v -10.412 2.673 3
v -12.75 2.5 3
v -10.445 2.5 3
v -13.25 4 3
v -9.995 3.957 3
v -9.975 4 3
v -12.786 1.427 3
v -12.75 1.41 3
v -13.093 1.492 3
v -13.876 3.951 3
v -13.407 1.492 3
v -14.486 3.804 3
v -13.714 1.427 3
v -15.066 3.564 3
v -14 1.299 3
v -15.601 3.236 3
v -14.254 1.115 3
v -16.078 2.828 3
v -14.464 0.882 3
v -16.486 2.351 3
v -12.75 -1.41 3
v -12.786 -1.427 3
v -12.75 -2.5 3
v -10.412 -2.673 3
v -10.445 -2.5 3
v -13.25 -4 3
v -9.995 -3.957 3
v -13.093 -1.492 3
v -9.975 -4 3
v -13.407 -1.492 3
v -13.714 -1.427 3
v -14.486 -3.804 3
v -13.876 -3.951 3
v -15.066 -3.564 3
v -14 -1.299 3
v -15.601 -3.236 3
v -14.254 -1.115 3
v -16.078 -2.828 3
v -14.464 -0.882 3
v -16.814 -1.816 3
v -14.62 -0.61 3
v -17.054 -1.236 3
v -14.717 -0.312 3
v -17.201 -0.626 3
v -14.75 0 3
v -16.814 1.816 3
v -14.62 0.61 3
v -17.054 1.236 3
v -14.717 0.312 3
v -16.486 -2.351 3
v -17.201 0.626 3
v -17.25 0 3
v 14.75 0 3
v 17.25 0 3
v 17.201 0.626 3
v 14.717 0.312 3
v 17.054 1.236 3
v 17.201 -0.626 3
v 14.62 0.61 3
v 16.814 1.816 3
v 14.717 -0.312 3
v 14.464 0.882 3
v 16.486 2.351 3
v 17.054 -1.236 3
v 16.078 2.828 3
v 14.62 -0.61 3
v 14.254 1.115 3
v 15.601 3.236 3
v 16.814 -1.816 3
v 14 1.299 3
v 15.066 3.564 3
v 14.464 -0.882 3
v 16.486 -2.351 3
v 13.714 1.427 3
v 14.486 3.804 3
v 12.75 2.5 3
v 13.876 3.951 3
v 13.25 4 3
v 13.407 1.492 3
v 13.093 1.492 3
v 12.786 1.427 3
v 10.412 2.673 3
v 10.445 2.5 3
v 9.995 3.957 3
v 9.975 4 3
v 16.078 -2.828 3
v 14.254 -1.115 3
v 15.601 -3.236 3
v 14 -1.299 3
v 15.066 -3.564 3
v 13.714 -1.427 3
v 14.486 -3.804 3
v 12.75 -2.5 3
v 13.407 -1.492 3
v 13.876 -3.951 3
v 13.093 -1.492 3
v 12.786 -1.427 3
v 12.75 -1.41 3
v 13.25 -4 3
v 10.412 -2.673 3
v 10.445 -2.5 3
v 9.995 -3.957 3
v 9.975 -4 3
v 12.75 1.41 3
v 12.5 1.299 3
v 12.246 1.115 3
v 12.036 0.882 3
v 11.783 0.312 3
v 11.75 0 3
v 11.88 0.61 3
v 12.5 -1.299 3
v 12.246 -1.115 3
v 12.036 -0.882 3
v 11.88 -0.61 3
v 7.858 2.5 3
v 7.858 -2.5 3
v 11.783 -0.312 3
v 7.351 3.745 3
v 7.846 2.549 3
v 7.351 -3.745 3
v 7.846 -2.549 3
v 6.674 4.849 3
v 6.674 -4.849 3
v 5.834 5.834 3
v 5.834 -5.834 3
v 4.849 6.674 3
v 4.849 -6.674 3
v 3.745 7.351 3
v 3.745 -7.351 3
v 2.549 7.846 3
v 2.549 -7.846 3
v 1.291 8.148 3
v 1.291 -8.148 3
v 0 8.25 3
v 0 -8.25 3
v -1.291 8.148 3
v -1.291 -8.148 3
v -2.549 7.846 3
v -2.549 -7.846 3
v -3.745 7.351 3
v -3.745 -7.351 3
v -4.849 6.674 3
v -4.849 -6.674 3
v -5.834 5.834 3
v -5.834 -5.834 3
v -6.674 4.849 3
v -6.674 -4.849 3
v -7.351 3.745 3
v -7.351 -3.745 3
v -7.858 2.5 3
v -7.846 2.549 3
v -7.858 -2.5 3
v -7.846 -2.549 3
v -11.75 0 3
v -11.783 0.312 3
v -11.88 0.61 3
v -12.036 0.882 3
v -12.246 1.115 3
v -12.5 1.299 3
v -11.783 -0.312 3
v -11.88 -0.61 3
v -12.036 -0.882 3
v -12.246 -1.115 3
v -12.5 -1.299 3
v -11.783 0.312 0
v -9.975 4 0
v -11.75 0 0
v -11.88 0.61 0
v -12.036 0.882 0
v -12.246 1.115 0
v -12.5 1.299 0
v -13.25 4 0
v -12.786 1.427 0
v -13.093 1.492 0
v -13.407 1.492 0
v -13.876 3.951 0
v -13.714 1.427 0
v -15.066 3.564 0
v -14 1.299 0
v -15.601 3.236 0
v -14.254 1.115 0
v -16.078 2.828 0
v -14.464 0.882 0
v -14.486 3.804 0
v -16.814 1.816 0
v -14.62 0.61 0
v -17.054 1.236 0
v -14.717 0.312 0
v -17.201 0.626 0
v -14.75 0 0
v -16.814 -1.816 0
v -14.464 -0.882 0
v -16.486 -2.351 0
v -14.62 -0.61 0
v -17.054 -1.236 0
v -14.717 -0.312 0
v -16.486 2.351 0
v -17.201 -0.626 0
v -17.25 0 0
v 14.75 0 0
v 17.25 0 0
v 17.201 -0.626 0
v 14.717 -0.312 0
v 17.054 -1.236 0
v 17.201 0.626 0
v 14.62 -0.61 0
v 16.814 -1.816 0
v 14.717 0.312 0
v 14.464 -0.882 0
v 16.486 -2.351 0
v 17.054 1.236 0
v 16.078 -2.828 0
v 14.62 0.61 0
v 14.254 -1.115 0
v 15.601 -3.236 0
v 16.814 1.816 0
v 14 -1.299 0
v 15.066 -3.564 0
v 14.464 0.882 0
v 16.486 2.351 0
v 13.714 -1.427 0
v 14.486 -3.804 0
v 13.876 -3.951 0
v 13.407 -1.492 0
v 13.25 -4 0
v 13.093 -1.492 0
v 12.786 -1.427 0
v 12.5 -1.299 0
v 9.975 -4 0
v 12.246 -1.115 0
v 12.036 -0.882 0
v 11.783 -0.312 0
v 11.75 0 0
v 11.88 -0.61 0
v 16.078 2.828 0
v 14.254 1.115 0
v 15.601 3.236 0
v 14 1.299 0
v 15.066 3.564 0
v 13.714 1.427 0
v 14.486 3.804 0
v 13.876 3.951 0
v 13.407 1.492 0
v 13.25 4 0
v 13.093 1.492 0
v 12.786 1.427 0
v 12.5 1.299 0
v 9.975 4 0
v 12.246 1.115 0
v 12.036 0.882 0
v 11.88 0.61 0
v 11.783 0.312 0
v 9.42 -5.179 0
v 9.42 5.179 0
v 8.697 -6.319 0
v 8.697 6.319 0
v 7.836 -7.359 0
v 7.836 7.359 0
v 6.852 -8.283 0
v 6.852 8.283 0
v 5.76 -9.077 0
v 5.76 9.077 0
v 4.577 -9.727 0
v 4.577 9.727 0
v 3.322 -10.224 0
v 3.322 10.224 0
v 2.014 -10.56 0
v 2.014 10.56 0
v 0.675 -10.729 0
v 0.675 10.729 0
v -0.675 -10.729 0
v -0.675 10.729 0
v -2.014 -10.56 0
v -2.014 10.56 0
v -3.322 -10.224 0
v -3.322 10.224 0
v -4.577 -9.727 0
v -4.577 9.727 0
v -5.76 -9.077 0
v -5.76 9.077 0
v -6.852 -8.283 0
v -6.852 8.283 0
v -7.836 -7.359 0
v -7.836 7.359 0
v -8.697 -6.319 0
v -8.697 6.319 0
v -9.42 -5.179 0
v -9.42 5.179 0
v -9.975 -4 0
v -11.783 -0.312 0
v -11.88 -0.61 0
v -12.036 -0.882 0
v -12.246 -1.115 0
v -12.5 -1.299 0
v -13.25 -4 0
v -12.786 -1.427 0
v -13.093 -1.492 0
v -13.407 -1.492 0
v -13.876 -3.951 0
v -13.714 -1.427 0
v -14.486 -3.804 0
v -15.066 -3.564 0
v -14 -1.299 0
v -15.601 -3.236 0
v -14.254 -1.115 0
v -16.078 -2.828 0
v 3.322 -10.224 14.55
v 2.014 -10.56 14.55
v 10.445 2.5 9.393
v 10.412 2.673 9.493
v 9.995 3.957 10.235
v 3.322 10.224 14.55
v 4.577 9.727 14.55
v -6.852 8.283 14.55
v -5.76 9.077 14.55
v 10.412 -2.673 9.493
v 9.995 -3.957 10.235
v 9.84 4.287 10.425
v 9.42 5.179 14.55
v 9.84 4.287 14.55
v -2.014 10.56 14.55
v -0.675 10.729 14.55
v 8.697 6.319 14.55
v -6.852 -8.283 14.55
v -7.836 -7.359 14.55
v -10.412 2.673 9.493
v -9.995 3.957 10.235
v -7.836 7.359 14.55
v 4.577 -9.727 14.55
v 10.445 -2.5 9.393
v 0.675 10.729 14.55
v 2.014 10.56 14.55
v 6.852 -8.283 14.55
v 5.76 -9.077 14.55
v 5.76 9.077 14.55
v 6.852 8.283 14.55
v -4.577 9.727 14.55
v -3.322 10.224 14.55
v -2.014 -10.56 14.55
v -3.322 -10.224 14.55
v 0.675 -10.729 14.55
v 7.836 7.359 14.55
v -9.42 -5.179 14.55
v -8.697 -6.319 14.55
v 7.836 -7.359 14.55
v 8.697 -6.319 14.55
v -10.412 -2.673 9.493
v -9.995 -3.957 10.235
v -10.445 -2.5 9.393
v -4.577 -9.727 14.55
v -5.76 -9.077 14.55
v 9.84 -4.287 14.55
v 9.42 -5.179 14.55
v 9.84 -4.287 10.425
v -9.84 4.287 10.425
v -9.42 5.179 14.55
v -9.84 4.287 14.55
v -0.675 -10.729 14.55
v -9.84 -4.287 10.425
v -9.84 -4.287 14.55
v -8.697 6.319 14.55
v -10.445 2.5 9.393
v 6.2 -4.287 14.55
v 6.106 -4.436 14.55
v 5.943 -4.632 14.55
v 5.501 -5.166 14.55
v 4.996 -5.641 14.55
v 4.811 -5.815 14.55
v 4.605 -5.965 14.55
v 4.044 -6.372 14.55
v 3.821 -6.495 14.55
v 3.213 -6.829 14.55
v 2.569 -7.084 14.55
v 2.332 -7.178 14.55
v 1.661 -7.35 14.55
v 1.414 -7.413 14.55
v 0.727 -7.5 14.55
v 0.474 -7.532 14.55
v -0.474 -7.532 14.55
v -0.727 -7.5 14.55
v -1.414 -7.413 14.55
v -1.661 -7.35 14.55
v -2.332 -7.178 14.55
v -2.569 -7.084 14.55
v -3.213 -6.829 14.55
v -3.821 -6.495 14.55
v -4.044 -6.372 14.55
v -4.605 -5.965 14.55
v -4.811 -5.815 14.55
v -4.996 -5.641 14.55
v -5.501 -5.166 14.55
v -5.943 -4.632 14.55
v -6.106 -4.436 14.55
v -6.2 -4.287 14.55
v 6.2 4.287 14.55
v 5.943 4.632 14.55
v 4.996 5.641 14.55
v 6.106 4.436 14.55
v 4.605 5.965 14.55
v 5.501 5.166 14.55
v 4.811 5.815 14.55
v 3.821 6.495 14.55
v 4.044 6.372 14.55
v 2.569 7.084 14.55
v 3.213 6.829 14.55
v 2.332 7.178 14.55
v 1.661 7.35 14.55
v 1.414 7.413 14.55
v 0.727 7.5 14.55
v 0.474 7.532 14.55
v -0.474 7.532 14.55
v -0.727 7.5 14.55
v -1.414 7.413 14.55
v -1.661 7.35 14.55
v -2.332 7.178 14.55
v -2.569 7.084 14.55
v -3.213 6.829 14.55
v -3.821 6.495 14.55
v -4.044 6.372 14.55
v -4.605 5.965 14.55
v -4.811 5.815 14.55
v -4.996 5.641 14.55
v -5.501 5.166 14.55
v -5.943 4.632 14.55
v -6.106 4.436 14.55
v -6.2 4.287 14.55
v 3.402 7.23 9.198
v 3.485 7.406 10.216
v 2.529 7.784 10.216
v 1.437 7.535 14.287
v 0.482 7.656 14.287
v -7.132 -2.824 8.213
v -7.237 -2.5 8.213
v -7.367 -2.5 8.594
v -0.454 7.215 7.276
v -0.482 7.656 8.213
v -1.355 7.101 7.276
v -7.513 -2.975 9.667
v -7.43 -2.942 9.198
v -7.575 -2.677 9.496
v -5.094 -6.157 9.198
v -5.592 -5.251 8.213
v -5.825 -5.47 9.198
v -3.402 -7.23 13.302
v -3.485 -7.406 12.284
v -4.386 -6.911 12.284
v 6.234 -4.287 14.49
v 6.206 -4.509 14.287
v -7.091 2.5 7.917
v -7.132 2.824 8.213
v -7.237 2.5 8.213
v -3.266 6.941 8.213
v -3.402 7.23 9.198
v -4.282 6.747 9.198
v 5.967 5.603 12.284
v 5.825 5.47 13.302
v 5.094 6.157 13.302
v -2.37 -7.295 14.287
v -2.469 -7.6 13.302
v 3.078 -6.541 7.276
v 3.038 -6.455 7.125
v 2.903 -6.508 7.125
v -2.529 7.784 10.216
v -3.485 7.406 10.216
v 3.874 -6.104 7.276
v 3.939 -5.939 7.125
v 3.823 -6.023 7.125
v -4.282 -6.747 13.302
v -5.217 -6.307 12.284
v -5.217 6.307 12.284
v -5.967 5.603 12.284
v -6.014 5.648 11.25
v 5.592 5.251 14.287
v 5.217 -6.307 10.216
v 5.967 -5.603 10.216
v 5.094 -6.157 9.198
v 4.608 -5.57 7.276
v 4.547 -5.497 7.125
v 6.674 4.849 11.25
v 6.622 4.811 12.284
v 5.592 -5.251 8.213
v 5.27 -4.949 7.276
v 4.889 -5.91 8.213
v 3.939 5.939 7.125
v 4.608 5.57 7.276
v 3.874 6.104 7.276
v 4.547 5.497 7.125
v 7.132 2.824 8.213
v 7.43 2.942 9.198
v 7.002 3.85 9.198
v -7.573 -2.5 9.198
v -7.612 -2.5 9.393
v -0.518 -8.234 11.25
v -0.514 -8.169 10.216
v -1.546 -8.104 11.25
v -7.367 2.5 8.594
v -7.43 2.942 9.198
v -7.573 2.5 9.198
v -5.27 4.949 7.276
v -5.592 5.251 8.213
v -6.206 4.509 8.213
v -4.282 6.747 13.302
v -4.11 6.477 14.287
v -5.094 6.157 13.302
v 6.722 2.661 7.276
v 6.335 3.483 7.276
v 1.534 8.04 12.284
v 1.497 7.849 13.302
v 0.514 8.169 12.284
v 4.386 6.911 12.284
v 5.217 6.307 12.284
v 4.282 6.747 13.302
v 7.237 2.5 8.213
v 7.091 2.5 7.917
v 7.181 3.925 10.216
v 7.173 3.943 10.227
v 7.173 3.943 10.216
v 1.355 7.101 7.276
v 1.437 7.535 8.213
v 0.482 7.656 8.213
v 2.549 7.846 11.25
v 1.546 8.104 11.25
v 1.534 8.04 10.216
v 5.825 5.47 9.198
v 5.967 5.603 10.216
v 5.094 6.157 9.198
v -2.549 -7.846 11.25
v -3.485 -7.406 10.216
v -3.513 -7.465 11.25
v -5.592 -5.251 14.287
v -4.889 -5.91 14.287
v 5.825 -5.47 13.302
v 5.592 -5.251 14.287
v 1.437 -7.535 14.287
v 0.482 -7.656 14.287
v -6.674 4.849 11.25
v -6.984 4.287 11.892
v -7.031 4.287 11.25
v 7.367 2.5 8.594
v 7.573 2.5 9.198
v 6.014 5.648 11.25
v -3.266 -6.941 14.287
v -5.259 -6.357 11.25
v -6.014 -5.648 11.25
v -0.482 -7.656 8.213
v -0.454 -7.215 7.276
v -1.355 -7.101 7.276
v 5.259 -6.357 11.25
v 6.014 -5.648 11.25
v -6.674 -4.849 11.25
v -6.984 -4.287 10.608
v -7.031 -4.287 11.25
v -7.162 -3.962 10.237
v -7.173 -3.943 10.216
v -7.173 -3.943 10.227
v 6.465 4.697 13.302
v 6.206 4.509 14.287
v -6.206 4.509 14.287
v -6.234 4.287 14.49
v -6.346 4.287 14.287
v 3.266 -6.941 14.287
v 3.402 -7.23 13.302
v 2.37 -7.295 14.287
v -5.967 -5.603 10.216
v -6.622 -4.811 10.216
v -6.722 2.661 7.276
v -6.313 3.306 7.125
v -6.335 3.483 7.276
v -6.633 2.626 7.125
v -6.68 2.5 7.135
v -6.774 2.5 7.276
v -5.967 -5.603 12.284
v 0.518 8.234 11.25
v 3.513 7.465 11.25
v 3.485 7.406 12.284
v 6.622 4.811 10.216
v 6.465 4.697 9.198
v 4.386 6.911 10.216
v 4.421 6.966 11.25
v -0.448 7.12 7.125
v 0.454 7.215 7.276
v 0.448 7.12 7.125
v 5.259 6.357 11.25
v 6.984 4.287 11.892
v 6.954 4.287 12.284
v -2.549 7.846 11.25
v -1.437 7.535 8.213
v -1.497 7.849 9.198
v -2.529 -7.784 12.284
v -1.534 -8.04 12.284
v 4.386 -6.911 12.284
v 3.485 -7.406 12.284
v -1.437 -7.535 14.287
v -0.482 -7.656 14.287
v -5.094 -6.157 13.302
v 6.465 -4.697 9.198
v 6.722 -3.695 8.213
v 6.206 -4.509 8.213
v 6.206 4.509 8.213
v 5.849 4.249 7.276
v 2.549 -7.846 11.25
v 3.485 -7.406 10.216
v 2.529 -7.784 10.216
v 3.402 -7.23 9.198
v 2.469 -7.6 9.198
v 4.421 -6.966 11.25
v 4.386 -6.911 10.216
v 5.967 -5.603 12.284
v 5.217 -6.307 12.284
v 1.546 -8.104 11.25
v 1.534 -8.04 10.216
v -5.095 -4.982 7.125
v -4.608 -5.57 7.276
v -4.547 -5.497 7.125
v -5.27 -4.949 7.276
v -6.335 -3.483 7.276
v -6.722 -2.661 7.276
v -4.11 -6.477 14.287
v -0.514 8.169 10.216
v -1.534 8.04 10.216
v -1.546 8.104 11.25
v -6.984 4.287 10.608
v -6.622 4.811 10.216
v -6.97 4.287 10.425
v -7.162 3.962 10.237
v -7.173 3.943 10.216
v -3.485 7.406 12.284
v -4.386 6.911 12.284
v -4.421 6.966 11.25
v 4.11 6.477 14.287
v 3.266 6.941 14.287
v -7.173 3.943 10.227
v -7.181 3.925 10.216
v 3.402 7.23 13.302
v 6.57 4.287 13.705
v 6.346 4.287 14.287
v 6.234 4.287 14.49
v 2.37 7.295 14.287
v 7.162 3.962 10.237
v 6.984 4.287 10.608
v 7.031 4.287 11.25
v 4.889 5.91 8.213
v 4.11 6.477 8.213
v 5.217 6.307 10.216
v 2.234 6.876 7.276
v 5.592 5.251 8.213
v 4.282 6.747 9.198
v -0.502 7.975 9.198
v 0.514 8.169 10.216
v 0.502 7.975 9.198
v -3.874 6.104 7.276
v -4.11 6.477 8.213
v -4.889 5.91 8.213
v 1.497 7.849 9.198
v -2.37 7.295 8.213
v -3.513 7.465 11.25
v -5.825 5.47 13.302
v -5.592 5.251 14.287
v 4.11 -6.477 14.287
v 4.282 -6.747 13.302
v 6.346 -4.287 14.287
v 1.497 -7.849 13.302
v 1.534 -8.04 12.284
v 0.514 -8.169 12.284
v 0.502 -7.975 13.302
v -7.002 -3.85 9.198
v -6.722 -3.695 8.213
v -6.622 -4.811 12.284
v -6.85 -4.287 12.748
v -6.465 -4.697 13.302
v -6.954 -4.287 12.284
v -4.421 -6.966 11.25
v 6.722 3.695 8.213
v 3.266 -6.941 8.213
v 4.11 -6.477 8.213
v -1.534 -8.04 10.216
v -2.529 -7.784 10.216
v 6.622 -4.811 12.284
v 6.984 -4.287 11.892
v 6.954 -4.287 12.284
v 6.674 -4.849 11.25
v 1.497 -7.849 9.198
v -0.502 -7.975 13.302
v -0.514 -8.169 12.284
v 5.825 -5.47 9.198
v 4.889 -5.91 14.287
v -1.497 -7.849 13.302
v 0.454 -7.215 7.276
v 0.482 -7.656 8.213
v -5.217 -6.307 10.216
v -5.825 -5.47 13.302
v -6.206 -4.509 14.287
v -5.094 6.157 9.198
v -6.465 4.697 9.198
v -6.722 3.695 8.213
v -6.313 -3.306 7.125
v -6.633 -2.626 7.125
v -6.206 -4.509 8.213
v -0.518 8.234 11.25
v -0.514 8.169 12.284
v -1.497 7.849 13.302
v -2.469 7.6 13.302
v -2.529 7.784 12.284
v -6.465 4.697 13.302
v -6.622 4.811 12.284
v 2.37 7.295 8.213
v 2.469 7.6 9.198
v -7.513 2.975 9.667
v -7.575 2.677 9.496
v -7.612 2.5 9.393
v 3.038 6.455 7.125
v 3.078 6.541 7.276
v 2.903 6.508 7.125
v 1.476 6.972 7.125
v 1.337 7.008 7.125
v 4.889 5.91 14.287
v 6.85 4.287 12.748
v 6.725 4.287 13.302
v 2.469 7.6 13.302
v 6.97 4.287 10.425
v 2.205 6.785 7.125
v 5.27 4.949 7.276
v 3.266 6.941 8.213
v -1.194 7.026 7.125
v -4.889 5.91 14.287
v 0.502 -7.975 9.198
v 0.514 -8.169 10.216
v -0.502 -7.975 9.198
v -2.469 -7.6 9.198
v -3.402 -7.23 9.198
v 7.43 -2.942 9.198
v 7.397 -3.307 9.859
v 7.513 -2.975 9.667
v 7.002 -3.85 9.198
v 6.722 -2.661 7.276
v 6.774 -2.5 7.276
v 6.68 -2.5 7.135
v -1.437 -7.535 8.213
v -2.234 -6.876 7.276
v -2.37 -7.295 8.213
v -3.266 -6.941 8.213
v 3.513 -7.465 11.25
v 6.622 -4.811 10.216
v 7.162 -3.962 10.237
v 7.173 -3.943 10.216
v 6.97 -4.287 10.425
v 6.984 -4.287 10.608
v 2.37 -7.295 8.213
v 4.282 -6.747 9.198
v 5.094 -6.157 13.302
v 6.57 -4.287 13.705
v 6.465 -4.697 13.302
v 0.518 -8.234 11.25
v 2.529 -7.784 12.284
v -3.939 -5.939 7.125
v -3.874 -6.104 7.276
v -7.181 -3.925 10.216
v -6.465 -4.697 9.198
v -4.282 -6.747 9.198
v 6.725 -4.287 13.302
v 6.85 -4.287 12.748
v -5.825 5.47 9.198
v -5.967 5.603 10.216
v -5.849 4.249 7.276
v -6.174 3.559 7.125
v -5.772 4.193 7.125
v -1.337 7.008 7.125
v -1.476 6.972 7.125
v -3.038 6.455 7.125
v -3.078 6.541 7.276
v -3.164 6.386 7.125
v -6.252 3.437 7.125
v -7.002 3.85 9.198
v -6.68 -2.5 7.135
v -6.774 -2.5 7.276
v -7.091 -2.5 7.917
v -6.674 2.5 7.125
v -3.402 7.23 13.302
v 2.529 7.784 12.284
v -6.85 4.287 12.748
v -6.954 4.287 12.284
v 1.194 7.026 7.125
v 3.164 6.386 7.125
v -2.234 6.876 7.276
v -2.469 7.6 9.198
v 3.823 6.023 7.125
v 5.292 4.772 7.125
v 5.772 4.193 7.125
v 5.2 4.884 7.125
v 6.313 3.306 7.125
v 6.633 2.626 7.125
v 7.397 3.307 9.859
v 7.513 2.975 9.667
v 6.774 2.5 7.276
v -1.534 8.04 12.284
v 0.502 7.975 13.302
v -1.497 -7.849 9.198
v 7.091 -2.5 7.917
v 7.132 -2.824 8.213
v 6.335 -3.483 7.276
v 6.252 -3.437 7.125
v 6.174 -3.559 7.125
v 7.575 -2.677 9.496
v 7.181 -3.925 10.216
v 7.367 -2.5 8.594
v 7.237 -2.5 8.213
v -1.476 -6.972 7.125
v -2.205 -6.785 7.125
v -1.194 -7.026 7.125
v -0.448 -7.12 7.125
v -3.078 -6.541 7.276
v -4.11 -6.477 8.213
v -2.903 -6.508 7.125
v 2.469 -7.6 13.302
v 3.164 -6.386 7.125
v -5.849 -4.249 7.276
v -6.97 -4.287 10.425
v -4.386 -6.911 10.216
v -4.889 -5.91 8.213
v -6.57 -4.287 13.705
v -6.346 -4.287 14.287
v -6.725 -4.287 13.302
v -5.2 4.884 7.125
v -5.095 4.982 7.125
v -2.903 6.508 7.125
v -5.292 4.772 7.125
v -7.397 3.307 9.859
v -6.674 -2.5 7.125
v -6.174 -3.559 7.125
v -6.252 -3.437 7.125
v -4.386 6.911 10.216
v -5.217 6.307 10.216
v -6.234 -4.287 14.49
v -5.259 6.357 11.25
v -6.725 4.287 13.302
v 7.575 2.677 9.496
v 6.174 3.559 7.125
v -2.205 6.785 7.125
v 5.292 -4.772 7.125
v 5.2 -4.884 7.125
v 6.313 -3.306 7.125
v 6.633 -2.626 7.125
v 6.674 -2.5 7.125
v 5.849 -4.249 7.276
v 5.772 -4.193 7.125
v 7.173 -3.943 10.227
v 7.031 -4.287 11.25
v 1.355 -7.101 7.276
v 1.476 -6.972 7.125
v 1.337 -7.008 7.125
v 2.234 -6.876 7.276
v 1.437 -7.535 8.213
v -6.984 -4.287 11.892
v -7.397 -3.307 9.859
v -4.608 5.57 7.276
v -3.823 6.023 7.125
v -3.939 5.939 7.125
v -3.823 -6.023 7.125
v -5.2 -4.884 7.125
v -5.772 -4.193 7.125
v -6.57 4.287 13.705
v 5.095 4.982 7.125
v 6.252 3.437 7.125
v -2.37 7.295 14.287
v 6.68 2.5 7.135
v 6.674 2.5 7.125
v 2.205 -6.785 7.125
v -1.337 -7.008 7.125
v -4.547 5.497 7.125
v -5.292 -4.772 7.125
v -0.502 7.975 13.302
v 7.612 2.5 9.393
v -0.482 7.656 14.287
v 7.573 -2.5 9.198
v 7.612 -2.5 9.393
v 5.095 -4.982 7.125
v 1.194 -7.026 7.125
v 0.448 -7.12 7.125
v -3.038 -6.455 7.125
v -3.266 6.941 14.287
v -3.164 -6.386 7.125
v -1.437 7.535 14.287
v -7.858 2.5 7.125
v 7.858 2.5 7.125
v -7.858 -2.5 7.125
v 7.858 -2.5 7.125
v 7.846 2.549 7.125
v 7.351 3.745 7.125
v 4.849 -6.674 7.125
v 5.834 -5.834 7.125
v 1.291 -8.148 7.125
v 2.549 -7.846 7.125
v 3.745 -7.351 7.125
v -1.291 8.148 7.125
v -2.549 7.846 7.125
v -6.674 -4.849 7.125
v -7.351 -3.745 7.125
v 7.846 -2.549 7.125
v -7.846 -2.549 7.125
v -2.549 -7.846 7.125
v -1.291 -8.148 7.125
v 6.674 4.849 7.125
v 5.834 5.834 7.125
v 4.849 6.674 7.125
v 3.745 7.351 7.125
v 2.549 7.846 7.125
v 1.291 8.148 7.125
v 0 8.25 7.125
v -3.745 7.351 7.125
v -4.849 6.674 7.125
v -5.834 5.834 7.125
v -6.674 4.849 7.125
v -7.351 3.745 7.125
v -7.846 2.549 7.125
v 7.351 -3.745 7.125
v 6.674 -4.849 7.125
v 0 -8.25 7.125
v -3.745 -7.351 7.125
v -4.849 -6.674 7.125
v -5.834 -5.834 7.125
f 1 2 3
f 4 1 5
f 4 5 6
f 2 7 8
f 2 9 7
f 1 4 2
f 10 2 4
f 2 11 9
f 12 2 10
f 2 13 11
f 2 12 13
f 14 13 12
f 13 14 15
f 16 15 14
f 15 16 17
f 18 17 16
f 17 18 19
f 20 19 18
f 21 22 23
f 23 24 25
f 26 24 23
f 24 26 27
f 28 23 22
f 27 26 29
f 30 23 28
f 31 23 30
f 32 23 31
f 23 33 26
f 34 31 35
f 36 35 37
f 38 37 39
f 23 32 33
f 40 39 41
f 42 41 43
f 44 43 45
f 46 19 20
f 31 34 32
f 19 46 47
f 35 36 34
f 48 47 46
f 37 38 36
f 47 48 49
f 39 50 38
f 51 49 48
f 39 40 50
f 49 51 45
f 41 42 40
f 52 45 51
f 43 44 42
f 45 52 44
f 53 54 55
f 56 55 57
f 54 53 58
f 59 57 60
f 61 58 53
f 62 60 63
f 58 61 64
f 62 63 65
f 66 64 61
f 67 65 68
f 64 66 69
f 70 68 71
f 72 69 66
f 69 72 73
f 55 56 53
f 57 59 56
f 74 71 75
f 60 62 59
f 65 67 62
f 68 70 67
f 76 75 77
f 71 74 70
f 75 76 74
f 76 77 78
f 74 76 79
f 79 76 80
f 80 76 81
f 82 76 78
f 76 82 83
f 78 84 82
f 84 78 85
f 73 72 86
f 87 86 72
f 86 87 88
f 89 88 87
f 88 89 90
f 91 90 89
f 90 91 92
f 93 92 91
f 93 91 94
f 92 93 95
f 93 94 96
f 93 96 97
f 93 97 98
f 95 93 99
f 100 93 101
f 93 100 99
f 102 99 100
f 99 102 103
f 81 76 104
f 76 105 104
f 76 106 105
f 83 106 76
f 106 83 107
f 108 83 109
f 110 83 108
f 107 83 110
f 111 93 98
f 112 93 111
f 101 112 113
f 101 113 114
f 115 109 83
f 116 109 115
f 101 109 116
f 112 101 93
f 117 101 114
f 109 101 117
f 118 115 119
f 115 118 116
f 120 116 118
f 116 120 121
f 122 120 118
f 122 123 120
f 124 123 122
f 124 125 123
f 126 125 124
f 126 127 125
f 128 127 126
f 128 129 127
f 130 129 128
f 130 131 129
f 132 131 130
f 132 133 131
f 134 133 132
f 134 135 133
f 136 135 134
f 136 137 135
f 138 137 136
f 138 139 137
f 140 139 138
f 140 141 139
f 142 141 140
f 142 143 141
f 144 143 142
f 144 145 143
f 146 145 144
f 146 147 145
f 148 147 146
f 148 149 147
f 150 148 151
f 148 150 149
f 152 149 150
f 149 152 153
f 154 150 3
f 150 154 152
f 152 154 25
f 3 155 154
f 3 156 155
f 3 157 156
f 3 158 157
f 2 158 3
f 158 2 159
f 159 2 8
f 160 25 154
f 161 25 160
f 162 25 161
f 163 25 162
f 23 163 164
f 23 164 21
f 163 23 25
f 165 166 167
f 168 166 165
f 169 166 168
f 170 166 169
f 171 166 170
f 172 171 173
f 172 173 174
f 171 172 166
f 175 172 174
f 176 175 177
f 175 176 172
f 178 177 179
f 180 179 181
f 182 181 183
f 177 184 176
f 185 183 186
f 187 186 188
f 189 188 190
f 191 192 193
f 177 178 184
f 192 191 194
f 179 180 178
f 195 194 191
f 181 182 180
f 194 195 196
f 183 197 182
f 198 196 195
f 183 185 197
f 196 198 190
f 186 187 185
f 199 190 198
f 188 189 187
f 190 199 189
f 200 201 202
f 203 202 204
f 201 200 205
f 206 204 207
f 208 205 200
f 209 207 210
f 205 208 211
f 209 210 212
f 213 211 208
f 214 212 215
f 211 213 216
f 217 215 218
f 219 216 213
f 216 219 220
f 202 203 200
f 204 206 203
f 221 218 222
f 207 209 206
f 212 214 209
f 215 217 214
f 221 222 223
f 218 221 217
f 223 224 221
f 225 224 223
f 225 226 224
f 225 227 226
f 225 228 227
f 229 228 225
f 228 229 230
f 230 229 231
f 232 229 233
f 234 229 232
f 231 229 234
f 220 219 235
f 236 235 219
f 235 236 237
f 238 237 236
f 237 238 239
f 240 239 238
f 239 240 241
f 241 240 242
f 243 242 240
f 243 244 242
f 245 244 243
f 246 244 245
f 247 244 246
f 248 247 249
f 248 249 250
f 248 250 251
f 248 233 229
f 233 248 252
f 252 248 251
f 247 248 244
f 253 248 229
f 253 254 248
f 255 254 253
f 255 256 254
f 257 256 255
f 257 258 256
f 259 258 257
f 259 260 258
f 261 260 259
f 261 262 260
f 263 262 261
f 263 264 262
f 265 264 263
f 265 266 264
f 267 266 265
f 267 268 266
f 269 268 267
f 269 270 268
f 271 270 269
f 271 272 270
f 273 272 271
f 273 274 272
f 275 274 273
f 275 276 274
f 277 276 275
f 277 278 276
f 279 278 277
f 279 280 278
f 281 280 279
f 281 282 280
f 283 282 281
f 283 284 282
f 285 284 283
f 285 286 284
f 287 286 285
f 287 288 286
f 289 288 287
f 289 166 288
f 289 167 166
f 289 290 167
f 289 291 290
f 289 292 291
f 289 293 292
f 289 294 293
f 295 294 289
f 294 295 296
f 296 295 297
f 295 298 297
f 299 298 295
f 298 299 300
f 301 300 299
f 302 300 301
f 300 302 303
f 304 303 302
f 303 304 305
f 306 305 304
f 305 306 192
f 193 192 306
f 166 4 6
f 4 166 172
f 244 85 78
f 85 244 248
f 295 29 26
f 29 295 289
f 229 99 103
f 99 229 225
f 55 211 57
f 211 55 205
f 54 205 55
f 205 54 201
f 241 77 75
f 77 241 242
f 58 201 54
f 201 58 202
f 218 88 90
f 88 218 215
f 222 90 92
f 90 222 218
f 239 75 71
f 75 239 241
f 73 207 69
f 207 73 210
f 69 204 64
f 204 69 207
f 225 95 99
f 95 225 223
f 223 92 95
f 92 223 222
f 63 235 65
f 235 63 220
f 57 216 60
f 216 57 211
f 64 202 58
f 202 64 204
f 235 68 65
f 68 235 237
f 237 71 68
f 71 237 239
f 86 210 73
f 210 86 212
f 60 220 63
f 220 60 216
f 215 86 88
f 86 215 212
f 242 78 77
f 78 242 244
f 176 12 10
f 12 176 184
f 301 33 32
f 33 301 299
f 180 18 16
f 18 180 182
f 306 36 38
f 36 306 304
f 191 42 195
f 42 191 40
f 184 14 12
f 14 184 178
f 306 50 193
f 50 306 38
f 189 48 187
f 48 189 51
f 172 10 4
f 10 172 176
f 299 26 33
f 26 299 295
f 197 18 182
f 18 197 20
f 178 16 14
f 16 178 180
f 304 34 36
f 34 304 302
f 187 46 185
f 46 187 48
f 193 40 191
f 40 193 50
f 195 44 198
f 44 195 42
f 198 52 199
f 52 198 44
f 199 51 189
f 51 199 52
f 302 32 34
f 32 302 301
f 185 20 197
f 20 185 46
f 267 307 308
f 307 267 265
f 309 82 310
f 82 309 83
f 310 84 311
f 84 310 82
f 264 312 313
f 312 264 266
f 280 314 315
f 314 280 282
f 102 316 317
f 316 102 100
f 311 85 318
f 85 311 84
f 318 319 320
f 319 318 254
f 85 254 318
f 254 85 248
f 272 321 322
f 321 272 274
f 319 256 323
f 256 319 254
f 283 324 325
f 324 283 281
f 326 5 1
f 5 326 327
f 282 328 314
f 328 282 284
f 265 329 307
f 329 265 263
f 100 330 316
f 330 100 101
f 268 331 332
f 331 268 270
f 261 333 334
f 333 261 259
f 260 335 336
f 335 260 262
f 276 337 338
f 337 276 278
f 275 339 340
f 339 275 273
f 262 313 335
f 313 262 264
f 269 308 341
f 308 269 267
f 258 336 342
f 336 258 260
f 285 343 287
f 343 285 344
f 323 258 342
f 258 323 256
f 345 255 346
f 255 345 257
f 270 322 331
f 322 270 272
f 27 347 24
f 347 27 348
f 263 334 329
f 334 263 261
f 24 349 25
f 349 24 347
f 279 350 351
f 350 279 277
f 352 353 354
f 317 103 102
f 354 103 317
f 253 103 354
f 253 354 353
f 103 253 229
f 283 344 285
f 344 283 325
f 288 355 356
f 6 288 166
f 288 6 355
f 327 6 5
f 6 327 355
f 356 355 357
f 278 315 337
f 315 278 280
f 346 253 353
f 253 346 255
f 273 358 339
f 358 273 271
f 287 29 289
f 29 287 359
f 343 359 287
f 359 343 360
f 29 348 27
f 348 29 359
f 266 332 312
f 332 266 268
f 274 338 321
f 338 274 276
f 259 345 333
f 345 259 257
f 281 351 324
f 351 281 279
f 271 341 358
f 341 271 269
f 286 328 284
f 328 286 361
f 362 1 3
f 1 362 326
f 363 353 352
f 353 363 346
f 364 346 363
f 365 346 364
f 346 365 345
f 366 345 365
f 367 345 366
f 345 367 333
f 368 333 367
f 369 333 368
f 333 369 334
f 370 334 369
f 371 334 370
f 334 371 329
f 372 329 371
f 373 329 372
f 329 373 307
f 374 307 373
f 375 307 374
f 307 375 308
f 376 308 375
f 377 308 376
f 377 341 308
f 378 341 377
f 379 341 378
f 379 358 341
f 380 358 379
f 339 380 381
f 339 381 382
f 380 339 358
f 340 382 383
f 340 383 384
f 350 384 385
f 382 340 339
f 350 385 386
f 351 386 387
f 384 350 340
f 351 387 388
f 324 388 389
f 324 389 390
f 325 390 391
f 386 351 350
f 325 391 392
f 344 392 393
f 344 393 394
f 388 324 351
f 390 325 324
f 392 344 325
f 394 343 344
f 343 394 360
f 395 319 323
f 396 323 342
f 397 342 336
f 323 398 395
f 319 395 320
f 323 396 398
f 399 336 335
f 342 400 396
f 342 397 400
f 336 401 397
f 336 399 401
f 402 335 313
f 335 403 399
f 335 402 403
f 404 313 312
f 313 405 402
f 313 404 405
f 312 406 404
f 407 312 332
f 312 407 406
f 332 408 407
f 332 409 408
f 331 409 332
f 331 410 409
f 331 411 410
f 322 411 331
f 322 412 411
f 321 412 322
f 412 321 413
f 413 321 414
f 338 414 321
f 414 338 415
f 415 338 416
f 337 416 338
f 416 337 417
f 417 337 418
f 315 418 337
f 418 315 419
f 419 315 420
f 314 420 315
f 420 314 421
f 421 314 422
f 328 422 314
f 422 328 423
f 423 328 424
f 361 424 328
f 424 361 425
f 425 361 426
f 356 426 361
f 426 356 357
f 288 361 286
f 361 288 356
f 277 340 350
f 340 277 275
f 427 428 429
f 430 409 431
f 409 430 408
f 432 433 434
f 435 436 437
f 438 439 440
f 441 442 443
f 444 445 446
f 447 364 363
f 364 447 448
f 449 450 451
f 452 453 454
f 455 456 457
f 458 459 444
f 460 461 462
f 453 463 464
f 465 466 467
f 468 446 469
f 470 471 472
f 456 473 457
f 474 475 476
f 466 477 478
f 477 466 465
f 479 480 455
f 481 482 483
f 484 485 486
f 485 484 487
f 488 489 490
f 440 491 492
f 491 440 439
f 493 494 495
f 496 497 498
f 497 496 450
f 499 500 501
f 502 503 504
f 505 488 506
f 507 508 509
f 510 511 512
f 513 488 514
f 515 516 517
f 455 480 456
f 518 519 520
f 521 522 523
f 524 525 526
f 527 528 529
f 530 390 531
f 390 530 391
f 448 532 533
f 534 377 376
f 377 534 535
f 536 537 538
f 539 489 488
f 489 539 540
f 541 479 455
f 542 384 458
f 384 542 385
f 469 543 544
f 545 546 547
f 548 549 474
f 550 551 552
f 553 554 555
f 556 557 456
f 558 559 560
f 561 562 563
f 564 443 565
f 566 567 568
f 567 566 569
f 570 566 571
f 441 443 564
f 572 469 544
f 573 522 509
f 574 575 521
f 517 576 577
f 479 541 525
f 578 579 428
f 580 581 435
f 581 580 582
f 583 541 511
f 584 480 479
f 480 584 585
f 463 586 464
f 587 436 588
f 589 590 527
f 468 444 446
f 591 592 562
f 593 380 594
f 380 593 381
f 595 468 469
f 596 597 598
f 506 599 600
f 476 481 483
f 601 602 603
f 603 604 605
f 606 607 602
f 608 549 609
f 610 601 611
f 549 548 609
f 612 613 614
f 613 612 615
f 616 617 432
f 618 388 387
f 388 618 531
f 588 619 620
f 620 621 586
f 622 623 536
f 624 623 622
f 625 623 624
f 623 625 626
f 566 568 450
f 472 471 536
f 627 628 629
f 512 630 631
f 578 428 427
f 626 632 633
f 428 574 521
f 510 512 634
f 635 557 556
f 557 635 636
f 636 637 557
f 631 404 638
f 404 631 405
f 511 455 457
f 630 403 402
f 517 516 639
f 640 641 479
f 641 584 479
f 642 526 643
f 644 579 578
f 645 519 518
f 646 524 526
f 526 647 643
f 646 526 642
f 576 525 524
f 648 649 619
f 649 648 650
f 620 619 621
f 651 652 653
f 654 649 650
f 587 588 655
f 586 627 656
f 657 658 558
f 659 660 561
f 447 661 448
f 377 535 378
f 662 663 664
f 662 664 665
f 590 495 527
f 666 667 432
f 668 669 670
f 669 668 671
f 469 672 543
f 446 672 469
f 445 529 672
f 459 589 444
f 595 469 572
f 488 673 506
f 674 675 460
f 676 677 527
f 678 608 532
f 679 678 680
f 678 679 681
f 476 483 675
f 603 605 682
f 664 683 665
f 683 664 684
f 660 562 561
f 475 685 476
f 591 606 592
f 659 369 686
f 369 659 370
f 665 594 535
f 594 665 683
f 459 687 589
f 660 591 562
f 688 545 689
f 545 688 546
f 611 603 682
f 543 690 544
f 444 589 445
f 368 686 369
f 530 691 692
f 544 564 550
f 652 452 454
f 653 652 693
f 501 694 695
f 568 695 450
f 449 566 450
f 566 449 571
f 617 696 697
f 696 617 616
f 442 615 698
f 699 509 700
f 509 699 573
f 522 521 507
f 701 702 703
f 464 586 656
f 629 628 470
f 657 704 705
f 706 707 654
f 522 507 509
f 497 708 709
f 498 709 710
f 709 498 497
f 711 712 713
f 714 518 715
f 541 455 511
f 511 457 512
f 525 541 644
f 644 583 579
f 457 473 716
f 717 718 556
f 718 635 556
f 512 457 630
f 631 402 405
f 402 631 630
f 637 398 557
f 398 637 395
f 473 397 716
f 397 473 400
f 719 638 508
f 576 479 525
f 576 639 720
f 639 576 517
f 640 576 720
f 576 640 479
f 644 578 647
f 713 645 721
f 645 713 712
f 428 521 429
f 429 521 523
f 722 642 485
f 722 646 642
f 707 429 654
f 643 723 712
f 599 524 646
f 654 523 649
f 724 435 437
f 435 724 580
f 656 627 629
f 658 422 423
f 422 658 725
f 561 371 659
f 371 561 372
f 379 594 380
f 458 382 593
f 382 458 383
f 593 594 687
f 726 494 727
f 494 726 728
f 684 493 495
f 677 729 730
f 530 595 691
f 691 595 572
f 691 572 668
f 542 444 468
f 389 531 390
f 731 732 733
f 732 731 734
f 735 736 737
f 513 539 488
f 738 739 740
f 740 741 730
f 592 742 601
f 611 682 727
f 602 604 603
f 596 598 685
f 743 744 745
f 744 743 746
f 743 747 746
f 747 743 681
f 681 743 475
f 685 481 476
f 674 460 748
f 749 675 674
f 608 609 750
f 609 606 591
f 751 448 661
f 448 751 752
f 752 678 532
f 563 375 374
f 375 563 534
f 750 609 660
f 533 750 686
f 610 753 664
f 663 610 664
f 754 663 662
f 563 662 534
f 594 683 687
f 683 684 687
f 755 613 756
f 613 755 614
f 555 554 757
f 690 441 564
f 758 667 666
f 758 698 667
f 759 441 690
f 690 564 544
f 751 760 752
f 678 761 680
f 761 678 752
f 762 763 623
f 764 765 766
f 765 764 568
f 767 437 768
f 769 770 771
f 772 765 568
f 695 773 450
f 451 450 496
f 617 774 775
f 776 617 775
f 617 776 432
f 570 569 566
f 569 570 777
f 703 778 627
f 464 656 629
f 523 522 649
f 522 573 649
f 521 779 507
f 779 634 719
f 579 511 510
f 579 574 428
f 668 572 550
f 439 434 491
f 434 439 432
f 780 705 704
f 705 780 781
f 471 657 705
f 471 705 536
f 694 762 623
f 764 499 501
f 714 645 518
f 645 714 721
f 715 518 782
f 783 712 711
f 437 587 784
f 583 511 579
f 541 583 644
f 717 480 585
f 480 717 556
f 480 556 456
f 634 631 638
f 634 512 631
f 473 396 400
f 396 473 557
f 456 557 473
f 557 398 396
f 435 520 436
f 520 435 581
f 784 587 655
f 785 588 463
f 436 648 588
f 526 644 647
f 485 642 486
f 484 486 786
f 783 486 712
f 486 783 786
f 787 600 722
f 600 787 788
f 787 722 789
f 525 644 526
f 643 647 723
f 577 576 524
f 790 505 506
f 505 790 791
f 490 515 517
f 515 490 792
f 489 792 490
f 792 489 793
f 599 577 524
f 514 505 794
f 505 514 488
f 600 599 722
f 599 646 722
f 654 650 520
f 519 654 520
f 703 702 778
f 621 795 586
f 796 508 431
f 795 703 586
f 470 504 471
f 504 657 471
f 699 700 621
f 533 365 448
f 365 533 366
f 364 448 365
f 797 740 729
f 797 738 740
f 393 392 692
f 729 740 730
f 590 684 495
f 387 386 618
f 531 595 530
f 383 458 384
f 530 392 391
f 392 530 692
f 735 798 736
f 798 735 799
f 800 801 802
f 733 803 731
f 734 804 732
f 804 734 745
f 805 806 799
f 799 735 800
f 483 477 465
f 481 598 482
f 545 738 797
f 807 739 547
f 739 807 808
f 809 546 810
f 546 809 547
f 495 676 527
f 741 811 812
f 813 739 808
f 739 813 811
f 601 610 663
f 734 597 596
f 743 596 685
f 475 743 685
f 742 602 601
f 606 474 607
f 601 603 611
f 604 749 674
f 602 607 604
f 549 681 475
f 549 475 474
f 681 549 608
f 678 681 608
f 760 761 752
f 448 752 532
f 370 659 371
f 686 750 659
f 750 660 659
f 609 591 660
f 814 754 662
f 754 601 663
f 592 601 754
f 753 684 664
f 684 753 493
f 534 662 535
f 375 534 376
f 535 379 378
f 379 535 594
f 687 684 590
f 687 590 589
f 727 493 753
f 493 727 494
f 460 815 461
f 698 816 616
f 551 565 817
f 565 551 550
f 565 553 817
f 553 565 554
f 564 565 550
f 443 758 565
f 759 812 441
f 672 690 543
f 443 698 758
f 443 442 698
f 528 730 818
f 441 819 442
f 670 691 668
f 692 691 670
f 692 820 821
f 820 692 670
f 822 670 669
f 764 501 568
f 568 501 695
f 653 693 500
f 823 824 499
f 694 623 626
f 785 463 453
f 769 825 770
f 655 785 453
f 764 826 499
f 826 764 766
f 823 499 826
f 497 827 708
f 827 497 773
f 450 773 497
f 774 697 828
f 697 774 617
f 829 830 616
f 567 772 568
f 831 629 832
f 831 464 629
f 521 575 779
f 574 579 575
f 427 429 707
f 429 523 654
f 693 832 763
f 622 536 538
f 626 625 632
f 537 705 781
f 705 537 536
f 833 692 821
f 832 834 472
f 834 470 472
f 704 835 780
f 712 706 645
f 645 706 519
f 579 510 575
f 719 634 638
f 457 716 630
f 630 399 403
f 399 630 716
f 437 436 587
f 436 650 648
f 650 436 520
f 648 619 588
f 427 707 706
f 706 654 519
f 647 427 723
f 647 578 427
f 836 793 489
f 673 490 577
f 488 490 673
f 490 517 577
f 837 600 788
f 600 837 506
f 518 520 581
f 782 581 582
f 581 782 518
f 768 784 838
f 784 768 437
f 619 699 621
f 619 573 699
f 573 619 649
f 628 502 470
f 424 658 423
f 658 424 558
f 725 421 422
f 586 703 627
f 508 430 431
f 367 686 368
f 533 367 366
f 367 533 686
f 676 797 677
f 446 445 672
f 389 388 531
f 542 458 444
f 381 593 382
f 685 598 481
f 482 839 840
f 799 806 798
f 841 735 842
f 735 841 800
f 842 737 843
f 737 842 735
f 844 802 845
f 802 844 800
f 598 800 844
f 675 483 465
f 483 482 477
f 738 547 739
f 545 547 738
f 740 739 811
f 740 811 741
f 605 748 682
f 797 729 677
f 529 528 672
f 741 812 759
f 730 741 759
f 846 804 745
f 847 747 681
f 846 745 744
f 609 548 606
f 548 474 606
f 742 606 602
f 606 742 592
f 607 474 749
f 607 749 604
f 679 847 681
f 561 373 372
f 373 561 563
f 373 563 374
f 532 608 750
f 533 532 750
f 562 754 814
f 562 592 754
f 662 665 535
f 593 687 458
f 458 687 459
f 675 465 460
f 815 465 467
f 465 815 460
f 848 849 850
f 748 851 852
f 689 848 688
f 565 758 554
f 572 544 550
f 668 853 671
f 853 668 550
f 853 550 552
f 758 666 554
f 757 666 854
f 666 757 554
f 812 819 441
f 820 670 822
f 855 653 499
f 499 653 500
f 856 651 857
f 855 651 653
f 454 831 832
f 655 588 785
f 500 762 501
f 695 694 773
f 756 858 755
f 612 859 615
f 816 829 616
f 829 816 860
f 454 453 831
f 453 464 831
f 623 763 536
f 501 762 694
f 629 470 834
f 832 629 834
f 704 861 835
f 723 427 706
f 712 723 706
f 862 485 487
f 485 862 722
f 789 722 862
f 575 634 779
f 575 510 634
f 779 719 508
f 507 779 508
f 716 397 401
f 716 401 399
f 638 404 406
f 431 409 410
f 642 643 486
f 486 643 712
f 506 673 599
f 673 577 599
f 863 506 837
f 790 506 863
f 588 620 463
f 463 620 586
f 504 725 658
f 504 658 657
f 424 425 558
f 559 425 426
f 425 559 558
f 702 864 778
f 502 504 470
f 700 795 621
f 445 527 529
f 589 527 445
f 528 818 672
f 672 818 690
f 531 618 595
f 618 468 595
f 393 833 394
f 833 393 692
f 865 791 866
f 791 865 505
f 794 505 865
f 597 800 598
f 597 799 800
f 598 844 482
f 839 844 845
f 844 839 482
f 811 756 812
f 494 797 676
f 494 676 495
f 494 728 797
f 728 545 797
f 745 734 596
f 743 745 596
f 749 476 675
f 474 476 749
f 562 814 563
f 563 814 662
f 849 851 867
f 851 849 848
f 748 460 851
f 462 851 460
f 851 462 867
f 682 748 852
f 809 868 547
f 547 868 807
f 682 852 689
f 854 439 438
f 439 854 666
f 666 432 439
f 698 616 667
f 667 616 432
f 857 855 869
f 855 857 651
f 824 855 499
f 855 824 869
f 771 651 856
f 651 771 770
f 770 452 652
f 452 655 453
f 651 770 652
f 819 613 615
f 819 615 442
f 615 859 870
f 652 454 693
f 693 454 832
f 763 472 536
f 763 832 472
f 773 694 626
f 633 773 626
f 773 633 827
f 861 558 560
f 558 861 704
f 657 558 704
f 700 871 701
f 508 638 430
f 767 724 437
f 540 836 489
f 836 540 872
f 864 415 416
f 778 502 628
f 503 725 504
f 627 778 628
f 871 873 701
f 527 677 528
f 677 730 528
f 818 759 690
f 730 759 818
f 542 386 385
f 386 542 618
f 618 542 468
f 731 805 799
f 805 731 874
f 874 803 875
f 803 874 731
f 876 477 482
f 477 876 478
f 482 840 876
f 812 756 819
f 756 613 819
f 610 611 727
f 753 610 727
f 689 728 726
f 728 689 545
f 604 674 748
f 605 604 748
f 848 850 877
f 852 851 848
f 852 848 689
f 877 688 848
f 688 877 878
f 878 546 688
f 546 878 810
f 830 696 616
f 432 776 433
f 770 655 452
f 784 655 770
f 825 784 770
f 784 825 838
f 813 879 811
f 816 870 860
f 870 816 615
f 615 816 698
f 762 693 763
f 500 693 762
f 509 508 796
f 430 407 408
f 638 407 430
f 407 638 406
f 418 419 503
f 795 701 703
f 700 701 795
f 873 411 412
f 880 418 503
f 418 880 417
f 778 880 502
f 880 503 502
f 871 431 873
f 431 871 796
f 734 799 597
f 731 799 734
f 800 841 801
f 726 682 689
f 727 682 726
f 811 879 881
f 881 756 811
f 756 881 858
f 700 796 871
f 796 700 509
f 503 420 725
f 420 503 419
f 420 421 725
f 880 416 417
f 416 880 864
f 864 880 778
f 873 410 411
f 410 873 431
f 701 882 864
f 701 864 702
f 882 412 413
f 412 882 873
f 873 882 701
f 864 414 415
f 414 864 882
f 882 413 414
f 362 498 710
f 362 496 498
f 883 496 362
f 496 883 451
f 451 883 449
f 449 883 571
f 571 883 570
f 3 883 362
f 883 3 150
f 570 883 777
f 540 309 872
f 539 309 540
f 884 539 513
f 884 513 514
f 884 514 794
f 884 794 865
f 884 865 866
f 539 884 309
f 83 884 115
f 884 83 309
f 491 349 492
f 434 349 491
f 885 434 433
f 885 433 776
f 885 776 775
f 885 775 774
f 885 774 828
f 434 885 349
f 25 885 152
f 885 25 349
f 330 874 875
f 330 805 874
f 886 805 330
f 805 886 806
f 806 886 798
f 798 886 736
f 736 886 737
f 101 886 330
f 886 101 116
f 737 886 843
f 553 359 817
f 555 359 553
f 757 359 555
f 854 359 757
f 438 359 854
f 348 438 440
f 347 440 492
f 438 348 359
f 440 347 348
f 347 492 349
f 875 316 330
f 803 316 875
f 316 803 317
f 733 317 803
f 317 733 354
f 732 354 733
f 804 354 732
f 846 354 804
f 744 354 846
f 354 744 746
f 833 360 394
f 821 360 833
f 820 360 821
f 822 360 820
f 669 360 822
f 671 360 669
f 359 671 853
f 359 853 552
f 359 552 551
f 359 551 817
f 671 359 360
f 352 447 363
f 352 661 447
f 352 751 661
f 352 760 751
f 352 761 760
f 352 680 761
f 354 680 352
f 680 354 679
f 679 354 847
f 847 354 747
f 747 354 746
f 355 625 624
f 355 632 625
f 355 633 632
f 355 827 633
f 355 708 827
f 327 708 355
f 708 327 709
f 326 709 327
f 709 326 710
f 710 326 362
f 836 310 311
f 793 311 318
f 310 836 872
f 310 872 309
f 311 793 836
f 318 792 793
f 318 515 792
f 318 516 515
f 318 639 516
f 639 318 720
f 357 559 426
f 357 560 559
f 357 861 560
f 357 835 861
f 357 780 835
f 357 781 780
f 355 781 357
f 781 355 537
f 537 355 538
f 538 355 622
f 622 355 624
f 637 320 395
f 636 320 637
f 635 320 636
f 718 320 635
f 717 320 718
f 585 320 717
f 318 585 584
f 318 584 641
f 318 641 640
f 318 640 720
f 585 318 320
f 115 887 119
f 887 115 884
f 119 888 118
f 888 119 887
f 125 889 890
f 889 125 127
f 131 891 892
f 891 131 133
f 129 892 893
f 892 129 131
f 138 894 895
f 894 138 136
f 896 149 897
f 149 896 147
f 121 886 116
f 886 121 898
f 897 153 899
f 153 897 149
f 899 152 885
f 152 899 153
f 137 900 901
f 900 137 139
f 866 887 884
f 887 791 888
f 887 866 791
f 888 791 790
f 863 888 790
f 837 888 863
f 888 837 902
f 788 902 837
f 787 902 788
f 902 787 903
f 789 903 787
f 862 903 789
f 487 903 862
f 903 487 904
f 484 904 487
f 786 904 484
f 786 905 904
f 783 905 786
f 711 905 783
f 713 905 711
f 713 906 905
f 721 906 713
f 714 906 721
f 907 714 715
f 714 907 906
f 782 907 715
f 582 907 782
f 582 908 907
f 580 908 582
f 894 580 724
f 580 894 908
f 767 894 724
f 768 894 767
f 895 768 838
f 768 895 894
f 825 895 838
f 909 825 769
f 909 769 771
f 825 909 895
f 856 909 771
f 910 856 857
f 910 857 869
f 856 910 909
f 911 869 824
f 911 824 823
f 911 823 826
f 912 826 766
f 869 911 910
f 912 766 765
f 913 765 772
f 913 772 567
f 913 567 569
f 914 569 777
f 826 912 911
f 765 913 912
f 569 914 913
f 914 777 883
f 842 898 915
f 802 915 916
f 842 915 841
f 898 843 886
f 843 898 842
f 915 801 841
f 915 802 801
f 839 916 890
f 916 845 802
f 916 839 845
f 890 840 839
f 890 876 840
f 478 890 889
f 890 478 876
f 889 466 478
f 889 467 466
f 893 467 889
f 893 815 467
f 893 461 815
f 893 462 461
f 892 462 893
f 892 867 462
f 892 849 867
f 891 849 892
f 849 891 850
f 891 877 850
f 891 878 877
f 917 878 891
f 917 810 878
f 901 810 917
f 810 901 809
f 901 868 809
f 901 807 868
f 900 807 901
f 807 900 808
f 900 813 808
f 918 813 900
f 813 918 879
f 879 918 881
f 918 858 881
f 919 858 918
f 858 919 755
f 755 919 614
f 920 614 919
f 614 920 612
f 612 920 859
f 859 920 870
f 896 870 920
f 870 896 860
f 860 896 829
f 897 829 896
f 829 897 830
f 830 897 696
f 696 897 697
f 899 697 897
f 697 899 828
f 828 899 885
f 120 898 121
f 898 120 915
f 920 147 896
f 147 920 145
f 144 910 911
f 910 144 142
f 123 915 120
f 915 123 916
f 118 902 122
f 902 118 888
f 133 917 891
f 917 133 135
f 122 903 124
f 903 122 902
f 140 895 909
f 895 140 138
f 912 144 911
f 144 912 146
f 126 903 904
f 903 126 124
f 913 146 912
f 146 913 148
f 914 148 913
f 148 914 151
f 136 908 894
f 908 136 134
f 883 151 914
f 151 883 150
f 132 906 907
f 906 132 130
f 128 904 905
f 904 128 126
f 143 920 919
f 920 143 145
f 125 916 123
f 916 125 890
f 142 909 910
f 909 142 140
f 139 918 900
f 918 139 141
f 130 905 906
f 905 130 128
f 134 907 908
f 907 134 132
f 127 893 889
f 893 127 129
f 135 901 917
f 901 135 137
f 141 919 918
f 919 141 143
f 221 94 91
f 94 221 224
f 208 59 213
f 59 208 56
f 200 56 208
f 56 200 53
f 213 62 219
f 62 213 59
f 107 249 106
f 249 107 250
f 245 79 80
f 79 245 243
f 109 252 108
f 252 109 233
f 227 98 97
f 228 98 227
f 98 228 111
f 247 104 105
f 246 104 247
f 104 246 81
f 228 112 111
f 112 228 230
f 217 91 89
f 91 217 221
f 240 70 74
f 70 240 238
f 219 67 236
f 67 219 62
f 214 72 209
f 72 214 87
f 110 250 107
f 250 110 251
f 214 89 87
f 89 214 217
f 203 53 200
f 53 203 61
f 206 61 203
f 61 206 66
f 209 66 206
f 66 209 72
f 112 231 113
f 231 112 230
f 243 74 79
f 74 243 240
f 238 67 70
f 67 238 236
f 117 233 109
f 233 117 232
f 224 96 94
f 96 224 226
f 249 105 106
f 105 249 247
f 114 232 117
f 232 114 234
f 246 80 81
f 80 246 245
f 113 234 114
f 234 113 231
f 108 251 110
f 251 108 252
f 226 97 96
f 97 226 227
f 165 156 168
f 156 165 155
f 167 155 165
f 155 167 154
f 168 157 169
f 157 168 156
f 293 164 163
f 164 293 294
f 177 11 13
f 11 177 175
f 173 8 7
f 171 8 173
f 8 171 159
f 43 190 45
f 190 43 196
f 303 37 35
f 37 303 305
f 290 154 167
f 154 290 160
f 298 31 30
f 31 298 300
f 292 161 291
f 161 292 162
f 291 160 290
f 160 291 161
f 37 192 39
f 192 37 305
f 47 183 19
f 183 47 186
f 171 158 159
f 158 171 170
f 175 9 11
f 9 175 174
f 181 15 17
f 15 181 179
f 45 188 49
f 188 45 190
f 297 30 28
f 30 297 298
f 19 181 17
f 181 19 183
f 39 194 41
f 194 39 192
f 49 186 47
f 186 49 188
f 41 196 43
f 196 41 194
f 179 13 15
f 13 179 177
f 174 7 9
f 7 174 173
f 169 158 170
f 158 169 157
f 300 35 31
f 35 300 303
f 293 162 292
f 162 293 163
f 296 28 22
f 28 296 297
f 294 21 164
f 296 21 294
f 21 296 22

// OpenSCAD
ballDiameter = 16.5;
holeSize = 3;
wallThickness = 2.5;
gapWidth = 5;
baseThickness = 3;

baseHeight = ballDiameter+wallThickness*2;
baseWidth = wallThickness*4+ballDiameter;

module mainShape(){
	translate([-baseWidth/2, -wallThickness-holeSize/2]) cube([baseWidth, wallThickness*2+holeSize, baseThickness]);
	
	translate([baseHeight/2+wallThickness,0,0]) cylinder(baseThickness, holeSize/2+wallThickness,holeSize/2+wallThickness,$fn=40);
	translate([-baseHeight/2-wallThickness,0,0]) cylinder(baseThickness, holeSize/2+wallThickness,holeSize/2+wallThickness,$fn=40);

	cylinder(baseThickness+ballDiameter*0.7,baseHeight/2, baseHeight/2, $fn=50);
}

module cutout(){
	translate([0,0,ballDiameter/2+holeSize]) sphere(ballDiameter/2, $fn=50);
	translate([-baseHeight/2-2,-gapWidth/2,baseThickness]) cube([baseHeight+4,gapWidth,ballDiameter]);
	translate([-baseHeight/2-2,0,baseThickness+ballDiameter*0.6]) rotate([0,90]) cylinder(baseHeight+4,ballDiameter*0.3,ballDiameter*0.3,$fn=6);
	translate([0,0,baseThickness]) cylinder(ballDiameter/4, ballDiameter/2, ballDiameter/2, $fn=40);
}

module mountingHoles(){
	translate([ballDiameter/2+wallThickness*2,0,-1]) cylinder(baseThickness+2, holeSize/2, holeSize/2, $fn=30);
	translate([-(ballDiameter/2+wallThickness*2),0,-1]) cylinder(baseThickness+2, holeSize/2, holeSize/2, $fn=30);
}

difference(){
	mainShape();
	cutout();
	mountingHoles();
}
